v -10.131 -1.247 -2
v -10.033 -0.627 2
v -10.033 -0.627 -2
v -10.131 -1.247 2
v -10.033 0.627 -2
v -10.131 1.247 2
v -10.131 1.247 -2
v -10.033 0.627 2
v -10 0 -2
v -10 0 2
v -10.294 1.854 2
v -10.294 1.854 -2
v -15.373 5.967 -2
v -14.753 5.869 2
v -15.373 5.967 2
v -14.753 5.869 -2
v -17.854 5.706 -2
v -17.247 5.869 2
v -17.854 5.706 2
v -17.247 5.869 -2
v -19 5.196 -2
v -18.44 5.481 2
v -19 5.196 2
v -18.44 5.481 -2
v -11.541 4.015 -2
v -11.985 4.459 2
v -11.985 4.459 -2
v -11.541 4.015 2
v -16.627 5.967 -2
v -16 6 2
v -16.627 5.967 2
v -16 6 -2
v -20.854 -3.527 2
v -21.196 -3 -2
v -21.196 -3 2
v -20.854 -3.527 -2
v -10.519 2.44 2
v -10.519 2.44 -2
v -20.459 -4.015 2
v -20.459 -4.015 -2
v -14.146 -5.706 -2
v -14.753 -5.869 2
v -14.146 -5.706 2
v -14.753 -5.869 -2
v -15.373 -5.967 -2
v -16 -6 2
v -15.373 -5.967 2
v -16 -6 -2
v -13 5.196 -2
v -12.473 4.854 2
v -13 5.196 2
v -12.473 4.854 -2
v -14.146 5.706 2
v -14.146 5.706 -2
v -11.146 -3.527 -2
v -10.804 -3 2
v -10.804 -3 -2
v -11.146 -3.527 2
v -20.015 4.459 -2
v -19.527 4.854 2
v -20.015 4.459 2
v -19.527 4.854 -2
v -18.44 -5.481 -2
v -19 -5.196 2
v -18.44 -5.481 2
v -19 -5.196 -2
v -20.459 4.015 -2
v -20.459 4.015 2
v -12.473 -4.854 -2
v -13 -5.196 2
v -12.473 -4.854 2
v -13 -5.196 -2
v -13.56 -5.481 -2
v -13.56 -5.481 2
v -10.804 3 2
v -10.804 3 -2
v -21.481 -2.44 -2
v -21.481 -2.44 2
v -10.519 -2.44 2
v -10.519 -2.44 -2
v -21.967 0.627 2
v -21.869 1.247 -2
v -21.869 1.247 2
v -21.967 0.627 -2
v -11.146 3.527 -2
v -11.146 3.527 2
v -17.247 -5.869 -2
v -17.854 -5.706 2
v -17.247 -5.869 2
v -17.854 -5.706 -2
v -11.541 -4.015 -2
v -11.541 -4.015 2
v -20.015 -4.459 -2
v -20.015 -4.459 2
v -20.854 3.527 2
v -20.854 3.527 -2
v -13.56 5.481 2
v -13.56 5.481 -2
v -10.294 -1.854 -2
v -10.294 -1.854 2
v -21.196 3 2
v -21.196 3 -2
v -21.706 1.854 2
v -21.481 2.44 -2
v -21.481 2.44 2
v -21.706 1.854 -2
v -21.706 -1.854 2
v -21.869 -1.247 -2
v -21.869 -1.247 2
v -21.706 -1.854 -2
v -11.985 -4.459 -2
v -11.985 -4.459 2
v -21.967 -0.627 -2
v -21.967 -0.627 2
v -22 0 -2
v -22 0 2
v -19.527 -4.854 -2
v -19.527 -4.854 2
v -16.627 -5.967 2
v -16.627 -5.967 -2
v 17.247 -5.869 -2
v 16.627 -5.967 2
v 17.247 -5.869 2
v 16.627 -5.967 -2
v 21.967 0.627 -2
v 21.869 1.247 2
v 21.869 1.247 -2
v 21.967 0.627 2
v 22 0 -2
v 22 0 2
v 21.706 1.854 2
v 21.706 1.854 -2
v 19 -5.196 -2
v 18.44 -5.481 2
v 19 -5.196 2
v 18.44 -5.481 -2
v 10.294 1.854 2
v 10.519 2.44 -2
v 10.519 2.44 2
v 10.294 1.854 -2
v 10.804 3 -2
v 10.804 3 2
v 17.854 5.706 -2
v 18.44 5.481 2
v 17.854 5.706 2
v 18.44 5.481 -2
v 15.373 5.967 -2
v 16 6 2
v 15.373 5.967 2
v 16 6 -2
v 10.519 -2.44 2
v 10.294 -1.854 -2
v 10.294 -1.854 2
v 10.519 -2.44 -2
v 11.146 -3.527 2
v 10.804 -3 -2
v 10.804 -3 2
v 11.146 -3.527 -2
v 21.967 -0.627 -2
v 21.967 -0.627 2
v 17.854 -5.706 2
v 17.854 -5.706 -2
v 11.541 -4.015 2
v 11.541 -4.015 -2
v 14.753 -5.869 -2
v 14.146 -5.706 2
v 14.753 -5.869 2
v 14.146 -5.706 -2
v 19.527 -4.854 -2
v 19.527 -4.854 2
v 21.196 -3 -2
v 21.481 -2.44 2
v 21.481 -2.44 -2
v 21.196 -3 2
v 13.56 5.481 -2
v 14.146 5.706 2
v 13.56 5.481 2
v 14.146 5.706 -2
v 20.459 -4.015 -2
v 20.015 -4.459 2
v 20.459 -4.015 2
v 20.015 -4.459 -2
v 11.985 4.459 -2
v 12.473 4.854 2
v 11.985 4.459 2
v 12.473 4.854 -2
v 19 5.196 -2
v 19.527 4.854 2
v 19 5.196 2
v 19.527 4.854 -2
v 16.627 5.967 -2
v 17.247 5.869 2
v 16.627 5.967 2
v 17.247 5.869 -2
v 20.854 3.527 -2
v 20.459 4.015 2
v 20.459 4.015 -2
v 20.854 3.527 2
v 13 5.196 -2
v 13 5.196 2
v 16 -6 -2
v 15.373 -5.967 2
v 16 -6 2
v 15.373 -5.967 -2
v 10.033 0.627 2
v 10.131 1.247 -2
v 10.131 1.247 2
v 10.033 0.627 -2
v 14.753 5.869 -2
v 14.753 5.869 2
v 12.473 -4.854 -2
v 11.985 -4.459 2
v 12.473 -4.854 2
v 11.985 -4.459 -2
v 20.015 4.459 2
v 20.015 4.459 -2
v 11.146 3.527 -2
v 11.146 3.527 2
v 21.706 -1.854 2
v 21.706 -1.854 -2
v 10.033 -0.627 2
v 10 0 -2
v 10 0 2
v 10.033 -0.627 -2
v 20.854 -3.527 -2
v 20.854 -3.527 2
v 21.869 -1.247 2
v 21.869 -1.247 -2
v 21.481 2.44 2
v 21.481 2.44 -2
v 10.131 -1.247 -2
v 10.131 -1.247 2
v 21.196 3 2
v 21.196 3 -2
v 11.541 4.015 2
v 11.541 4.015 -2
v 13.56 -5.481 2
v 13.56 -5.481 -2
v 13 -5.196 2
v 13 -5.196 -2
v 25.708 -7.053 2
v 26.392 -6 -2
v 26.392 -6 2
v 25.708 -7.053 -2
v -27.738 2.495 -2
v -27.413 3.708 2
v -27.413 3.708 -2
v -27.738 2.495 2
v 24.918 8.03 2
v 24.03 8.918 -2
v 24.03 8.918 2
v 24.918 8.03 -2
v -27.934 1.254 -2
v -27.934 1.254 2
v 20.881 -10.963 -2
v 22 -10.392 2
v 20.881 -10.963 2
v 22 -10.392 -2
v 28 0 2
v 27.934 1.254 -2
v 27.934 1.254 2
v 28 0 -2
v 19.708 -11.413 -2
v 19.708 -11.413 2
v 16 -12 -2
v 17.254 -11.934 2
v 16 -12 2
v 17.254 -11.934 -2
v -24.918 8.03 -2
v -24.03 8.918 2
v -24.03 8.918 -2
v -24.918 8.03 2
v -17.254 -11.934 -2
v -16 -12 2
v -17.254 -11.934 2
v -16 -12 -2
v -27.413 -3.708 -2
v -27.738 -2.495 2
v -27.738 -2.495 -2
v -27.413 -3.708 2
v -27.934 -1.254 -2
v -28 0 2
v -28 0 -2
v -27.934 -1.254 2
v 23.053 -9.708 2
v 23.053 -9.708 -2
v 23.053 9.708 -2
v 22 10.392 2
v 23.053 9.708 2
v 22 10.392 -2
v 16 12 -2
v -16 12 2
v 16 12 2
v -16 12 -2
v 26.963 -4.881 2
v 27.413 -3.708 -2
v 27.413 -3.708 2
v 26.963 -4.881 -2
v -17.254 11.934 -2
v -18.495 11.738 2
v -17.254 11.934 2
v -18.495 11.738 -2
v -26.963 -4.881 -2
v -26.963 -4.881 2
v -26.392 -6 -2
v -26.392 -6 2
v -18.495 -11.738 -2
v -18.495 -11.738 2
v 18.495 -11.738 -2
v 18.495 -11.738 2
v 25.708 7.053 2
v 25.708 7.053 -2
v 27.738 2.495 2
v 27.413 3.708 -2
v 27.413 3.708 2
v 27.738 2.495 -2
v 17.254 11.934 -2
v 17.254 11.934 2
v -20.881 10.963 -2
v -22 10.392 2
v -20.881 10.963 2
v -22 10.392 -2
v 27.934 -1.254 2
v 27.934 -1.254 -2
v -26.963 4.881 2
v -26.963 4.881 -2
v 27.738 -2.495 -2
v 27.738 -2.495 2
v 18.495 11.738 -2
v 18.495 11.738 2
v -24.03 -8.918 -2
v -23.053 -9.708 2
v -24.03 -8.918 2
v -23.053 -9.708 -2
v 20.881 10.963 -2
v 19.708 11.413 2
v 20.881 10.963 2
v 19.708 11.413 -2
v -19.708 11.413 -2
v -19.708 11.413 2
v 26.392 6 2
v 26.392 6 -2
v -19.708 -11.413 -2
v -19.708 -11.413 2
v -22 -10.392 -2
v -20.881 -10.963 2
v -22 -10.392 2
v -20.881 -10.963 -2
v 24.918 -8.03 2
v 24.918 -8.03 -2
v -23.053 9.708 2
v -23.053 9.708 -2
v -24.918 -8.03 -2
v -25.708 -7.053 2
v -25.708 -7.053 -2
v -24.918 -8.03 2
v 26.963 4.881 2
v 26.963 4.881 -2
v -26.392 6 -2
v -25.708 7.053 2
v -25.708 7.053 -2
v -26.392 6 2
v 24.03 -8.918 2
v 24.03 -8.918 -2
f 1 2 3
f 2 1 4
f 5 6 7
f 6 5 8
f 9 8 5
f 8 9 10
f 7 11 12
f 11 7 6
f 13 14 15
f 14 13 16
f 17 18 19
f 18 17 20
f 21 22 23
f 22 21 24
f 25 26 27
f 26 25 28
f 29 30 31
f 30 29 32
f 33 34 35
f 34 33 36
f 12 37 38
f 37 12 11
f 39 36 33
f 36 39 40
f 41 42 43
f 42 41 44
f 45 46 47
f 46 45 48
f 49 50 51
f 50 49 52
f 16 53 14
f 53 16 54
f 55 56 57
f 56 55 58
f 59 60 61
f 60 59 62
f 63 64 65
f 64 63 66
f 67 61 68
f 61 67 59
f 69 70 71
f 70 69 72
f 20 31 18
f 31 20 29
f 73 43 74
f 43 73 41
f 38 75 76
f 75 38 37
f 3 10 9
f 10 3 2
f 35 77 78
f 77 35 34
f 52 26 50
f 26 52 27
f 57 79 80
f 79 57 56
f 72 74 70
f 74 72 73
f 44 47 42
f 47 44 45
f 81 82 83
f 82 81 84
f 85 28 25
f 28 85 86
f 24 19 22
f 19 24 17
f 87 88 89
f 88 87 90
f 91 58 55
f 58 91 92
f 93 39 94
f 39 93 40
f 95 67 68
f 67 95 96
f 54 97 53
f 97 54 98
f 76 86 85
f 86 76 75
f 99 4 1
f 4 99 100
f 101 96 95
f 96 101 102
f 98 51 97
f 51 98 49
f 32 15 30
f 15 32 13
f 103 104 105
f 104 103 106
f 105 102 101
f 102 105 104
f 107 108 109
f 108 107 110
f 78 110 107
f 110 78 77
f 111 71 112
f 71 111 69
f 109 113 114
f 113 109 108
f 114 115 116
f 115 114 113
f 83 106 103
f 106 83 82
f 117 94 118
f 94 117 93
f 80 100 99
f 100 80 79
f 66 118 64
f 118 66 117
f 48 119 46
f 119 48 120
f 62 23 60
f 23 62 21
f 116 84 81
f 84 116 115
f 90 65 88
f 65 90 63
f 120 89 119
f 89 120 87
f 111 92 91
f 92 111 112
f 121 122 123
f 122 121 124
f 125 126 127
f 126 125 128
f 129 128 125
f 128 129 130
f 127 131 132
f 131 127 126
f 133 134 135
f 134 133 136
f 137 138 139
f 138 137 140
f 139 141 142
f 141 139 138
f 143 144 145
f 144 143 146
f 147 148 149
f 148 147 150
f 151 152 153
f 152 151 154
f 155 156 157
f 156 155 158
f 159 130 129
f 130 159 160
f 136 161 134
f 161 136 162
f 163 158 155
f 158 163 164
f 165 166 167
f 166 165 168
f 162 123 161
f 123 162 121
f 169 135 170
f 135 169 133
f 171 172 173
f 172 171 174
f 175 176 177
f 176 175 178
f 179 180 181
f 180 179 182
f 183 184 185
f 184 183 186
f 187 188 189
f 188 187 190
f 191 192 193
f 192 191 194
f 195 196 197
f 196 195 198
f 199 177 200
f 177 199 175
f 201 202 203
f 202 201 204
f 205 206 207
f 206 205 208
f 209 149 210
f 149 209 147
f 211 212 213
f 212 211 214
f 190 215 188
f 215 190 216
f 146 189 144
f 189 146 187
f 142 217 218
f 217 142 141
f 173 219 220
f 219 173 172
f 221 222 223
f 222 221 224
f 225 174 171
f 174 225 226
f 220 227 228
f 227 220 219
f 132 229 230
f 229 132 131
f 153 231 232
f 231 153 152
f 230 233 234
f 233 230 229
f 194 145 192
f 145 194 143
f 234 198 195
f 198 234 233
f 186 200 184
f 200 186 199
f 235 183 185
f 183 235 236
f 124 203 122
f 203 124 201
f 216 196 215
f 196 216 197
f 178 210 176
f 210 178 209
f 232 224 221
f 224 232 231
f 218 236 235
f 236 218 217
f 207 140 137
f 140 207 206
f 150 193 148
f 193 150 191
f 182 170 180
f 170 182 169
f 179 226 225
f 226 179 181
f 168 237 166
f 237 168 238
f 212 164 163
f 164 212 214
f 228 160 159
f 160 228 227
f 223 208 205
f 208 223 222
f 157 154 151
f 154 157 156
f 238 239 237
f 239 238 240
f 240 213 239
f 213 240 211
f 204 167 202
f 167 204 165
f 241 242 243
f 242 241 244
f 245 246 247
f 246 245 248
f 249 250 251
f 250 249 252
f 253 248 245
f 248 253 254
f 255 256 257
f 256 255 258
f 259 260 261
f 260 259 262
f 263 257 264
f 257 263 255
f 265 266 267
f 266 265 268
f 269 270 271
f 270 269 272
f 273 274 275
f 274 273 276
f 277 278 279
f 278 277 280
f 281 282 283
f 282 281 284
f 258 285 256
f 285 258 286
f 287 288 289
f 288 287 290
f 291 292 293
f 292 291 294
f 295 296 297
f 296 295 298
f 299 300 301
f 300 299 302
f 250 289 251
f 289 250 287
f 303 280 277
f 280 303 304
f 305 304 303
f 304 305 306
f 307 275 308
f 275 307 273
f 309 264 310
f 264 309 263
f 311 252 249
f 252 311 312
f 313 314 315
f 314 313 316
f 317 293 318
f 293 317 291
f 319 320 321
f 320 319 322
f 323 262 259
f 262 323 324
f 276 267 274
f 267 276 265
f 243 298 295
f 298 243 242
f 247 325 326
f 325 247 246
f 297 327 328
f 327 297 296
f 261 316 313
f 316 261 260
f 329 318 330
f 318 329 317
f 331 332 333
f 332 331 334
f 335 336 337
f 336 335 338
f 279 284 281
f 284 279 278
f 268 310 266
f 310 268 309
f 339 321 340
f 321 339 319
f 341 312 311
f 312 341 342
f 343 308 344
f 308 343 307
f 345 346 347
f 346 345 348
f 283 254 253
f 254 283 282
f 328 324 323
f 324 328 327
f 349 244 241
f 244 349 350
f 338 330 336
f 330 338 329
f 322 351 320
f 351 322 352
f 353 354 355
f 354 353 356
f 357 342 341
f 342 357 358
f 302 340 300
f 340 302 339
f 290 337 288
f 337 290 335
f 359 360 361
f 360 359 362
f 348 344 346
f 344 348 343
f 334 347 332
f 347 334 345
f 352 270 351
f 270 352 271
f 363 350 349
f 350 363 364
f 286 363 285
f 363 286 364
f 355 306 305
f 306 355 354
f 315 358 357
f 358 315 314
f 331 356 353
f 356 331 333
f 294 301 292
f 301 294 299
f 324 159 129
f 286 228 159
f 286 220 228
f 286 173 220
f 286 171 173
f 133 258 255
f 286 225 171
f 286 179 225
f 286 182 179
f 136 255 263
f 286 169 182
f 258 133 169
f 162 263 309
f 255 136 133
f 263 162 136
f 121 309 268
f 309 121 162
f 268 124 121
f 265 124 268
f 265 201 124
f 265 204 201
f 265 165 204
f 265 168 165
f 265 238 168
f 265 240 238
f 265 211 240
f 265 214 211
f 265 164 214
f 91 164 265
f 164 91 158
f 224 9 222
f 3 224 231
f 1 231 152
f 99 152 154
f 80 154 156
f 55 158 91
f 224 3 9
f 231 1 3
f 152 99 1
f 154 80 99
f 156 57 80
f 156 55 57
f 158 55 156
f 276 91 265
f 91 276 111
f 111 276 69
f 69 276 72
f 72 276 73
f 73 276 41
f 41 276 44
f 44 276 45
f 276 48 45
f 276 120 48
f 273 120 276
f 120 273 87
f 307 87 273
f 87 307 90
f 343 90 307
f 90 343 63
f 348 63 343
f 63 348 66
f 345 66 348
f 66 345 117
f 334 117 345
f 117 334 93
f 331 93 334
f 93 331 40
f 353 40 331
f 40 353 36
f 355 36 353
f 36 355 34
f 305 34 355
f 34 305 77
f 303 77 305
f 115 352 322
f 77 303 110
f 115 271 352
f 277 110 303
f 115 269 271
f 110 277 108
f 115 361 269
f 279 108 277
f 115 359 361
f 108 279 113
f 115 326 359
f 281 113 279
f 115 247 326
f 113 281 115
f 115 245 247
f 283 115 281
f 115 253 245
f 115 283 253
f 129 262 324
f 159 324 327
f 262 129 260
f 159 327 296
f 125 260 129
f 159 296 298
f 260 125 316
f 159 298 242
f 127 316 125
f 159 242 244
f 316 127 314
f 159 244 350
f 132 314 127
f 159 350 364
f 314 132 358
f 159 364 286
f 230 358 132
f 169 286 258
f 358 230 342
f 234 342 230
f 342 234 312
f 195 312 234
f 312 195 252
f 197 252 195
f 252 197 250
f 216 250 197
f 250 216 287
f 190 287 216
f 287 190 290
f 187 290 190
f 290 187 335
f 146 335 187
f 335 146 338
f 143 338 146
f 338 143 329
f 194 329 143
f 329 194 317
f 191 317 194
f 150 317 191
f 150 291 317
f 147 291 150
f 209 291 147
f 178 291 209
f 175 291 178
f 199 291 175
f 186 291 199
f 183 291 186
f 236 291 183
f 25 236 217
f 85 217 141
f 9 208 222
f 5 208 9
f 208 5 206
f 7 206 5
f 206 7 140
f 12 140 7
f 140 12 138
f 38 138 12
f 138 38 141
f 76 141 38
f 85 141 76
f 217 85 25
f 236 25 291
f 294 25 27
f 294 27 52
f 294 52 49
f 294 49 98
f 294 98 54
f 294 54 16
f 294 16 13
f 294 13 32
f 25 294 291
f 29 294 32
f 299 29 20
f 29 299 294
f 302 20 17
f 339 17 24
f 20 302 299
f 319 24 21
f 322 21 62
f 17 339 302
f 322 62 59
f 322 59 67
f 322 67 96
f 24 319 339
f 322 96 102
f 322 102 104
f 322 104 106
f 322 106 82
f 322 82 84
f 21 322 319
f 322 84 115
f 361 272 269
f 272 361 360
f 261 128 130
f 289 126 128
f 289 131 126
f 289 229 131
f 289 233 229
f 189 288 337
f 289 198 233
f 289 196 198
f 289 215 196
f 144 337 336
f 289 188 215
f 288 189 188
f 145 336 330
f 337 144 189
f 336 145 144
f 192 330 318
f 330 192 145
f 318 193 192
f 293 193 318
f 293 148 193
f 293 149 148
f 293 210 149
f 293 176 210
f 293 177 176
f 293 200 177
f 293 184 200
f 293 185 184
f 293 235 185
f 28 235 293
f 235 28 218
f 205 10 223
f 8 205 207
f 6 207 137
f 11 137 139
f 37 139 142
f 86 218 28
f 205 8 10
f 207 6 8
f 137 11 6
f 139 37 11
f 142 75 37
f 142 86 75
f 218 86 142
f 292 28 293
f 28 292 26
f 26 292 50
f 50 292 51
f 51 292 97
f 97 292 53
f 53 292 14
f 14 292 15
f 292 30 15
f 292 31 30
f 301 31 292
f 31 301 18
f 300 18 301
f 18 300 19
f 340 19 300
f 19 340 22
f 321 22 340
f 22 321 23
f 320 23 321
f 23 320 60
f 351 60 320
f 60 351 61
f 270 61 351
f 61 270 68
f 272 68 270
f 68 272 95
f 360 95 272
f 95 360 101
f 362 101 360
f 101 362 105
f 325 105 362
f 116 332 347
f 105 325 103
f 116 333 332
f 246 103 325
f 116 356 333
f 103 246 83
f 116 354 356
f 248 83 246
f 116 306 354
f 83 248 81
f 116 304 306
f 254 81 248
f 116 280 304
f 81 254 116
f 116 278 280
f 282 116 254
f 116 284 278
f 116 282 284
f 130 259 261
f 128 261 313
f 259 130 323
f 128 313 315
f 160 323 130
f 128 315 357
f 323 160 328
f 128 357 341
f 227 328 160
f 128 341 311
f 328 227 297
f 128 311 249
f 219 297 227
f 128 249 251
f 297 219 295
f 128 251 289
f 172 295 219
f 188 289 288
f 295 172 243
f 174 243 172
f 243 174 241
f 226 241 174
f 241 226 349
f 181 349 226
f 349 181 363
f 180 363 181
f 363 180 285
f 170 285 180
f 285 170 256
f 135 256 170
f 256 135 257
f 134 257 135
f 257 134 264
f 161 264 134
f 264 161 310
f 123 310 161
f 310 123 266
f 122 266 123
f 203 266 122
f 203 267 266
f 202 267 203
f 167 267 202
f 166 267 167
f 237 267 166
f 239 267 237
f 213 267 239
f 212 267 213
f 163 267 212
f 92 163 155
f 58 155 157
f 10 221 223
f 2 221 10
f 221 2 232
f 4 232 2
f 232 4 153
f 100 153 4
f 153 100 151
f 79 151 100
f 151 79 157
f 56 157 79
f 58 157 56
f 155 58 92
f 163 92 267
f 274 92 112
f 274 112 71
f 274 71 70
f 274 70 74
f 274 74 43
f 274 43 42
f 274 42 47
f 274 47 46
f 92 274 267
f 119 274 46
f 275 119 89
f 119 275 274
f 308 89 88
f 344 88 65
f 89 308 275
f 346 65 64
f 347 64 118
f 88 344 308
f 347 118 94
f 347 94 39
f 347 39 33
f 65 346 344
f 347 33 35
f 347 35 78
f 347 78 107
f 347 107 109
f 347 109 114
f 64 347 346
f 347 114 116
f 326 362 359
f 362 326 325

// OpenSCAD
// Two-hole link plate.
$fn = 60;
eps = 0.02;
hole_d = 12;
length = 56;
width = 24;
thickness = 4;
difference() { hull() { translate([-length/2+width/2,0,0]) cylinder(d=width,h=thickness,center=true); translate([length/2-width/2,0,0]) cylinder(d=width,h=thickness,center=true); } for(x=[-length/2+width/2,length/2-width/2]) translate([x,0,-thickness/2-eps]) cylinder(d=hole_d,h=thickness+2*eps); }
